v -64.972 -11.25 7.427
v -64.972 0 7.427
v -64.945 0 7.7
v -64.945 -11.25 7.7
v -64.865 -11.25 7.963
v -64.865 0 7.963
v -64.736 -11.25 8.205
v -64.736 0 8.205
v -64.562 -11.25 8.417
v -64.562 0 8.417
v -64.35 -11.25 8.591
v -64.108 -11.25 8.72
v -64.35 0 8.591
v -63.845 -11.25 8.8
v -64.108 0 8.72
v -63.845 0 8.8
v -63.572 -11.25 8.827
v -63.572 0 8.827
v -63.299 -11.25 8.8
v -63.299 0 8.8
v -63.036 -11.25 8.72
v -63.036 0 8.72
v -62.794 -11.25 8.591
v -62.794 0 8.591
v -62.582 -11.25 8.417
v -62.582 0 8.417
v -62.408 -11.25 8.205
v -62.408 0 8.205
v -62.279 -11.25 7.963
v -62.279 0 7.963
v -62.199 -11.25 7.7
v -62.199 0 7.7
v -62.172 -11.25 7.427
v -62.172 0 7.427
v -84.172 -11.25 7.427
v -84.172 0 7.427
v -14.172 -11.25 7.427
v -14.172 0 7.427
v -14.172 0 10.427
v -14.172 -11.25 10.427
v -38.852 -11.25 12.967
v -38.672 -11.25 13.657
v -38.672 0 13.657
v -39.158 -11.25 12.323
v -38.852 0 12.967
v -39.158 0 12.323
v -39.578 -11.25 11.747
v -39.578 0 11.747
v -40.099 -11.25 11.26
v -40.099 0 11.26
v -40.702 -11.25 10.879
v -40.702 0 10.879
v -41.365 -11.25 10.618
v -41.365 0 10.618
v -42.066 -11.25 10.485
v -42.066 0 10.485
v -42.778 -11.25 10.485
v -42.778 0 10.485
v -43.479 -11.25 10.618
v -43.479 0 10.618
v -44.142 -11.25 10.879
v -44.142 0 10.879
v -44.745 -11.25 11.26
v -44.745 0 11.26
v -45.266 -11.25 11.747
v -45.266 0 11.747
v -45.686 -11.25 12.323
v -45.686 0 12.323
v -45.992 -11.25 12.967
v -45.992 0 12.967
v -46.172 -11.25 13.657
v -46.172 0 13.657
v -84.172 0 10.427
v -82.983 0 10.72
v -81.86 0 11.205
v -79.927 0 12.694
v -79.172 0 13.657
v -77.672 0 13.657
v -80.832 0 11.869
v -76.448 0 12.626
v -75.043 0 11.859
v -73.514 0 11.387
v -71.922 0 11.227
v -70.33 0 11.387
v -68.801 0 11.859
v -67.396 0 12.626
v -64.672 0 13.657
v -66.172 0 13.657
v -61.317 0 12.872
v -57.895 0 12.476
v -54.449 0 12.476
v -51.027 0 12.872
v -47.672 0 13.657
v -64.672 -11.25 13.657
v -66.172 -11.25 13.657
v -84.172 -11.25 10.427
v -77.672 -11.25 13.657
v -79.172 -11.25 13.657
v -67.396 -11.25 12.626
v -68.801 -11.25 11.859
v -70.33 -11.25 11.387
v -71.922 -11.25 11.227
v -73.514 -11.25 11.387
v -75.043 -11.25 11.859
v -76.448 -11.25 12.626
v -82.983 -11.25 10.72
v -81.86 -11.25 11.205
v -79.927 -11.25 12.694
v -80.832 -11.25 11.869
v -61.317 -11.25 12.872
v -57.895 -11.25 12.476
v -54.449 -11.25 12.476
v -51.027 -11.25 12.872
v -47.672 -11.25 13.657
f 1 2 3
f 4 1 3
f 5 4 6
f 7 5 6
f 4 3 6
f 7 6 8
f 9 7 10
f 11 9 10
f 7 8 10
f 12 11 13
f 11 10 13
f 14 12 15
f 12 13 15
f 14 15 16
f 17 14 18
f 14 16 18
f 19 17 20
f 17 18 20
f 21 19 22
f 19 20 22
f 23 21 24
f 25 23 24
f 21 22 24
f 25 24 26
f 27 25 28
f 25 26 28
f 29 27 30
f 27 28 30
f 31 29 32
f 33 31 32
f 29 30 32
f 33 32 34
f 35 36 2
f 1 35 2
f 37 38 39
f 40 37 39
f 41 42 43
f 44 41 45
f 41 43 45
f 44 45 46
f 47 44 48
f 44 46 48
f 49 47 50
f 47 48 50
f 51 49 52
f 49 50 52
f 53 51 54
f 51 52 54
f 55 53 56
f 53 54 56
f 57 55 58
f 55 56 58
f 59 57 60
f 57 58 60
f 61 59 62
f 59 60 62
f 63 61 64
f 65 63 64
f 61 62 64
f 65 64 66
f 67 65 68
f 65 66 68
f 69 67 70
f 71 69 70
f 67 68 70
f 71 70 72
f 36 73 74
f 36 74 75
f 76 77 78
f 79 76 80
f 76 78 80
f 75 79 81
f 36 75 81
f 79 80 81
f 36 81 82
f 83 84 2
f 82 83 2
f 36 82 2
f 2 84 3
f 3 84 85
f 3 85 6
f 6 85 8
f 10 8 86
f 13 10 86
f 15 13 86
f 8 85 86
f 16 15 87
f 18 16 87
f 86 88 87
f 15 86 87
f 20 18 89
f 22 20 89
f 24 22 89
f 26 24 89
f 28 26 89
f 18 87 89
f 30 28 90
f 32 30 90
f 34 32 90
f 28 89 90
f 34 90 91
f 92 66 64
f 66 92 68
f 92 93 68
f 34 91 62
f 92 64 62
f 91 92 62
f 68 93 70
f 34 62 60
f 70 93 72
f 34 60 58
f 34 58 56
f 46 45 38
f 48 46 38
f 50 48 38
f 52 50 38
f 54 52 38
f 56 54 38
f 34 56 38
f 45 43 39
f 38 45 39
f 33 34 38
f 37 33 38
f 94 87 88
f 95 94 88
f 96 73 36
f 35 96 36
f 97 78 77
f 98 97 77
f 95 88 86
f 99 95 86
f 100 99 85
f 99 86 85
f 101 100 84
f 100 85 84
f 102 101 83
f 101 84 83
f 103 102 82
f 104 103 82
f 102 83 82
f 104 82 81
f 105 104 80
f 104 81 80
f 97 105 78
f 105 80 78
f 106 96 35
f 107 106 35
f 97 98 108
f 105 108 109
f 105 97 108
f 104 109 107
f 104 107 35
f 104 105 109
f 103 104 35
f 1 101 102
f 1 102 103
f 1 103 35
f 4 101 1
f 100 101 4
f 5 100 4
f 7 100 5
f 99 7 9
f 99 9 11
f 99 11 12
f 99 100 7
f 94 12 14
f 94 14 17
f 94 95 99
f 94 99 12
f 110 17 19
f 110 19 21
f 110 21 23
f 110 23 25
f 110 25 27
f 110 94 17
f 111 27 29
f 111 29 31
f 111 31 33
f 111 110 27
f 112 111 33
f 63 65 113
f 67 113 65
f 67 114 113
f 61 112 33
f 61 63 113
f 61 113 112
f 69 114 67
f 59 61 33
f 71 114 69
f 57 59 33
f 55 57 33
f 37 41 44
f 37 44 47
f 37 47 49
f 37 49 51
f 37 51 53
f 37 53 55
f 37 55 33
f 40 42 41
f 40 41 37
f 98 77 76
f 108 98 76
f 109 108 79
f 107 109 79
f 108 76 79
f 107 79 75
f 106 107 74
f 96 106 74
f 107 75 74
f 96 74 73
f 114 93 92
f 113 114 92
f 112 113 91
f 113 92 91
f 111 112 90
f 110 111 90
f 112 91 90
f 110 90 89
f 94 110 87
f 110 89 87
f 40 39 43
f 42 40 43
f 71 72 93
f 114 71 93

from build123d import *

# Parameters (mm, degrees)
F1_DEPTH = 11.25


with BuildPart() as f1:
    # F0 (on Front) → F1 (new body)
    with BuildSketch(Plane.XZ):
        with BuildLine():
            ThreePointArc((-79.171997, 13.656926), (-81.33179, 11.51529), (-84.171997, 10.426926))
            Line((-84.171997, 10.426926), (-84.171997, 7.426926))
            Line((-84.171997, 7.426926), (-64.971997, 7.426926))
            ThreePointArc((-64.971997, 7.426926), (-63.571997, 8.826926), (-62.171997, 7.426926))
            Line((-62.171997, 7.426926), (-14.171997, 7.426926))
            Line((-14.171997, 7.426926), (-14.171997, 10.426926))
            Line((-14.171997, 10.426926), (-38.671997, 13.656926))
            ThreePointArc((-38.671997, 13.656926), (-42.421997, 10.46775), (-46.171997, 13.656926))
            Line((-46.171997, 13.656926), (-47.671997, 13.656926))
            ThreePointArc((-47.671997, 13.656926), (-56.171997, 12.426926), (-64.671997, 13.656926))
            Line((-64.671997, 13.656926), (-66.171997, 13.656926))
            ThreePointArc((-66.171997, 13.656926), (-71.921997, 11.226926), (-77.671997, 13.656926))
            Line((-77.671997, 13.656926), (-79.171997, 13.656926))
        make_face()
    extrude(amount=F1_DEPTH)


solid = f1.part
